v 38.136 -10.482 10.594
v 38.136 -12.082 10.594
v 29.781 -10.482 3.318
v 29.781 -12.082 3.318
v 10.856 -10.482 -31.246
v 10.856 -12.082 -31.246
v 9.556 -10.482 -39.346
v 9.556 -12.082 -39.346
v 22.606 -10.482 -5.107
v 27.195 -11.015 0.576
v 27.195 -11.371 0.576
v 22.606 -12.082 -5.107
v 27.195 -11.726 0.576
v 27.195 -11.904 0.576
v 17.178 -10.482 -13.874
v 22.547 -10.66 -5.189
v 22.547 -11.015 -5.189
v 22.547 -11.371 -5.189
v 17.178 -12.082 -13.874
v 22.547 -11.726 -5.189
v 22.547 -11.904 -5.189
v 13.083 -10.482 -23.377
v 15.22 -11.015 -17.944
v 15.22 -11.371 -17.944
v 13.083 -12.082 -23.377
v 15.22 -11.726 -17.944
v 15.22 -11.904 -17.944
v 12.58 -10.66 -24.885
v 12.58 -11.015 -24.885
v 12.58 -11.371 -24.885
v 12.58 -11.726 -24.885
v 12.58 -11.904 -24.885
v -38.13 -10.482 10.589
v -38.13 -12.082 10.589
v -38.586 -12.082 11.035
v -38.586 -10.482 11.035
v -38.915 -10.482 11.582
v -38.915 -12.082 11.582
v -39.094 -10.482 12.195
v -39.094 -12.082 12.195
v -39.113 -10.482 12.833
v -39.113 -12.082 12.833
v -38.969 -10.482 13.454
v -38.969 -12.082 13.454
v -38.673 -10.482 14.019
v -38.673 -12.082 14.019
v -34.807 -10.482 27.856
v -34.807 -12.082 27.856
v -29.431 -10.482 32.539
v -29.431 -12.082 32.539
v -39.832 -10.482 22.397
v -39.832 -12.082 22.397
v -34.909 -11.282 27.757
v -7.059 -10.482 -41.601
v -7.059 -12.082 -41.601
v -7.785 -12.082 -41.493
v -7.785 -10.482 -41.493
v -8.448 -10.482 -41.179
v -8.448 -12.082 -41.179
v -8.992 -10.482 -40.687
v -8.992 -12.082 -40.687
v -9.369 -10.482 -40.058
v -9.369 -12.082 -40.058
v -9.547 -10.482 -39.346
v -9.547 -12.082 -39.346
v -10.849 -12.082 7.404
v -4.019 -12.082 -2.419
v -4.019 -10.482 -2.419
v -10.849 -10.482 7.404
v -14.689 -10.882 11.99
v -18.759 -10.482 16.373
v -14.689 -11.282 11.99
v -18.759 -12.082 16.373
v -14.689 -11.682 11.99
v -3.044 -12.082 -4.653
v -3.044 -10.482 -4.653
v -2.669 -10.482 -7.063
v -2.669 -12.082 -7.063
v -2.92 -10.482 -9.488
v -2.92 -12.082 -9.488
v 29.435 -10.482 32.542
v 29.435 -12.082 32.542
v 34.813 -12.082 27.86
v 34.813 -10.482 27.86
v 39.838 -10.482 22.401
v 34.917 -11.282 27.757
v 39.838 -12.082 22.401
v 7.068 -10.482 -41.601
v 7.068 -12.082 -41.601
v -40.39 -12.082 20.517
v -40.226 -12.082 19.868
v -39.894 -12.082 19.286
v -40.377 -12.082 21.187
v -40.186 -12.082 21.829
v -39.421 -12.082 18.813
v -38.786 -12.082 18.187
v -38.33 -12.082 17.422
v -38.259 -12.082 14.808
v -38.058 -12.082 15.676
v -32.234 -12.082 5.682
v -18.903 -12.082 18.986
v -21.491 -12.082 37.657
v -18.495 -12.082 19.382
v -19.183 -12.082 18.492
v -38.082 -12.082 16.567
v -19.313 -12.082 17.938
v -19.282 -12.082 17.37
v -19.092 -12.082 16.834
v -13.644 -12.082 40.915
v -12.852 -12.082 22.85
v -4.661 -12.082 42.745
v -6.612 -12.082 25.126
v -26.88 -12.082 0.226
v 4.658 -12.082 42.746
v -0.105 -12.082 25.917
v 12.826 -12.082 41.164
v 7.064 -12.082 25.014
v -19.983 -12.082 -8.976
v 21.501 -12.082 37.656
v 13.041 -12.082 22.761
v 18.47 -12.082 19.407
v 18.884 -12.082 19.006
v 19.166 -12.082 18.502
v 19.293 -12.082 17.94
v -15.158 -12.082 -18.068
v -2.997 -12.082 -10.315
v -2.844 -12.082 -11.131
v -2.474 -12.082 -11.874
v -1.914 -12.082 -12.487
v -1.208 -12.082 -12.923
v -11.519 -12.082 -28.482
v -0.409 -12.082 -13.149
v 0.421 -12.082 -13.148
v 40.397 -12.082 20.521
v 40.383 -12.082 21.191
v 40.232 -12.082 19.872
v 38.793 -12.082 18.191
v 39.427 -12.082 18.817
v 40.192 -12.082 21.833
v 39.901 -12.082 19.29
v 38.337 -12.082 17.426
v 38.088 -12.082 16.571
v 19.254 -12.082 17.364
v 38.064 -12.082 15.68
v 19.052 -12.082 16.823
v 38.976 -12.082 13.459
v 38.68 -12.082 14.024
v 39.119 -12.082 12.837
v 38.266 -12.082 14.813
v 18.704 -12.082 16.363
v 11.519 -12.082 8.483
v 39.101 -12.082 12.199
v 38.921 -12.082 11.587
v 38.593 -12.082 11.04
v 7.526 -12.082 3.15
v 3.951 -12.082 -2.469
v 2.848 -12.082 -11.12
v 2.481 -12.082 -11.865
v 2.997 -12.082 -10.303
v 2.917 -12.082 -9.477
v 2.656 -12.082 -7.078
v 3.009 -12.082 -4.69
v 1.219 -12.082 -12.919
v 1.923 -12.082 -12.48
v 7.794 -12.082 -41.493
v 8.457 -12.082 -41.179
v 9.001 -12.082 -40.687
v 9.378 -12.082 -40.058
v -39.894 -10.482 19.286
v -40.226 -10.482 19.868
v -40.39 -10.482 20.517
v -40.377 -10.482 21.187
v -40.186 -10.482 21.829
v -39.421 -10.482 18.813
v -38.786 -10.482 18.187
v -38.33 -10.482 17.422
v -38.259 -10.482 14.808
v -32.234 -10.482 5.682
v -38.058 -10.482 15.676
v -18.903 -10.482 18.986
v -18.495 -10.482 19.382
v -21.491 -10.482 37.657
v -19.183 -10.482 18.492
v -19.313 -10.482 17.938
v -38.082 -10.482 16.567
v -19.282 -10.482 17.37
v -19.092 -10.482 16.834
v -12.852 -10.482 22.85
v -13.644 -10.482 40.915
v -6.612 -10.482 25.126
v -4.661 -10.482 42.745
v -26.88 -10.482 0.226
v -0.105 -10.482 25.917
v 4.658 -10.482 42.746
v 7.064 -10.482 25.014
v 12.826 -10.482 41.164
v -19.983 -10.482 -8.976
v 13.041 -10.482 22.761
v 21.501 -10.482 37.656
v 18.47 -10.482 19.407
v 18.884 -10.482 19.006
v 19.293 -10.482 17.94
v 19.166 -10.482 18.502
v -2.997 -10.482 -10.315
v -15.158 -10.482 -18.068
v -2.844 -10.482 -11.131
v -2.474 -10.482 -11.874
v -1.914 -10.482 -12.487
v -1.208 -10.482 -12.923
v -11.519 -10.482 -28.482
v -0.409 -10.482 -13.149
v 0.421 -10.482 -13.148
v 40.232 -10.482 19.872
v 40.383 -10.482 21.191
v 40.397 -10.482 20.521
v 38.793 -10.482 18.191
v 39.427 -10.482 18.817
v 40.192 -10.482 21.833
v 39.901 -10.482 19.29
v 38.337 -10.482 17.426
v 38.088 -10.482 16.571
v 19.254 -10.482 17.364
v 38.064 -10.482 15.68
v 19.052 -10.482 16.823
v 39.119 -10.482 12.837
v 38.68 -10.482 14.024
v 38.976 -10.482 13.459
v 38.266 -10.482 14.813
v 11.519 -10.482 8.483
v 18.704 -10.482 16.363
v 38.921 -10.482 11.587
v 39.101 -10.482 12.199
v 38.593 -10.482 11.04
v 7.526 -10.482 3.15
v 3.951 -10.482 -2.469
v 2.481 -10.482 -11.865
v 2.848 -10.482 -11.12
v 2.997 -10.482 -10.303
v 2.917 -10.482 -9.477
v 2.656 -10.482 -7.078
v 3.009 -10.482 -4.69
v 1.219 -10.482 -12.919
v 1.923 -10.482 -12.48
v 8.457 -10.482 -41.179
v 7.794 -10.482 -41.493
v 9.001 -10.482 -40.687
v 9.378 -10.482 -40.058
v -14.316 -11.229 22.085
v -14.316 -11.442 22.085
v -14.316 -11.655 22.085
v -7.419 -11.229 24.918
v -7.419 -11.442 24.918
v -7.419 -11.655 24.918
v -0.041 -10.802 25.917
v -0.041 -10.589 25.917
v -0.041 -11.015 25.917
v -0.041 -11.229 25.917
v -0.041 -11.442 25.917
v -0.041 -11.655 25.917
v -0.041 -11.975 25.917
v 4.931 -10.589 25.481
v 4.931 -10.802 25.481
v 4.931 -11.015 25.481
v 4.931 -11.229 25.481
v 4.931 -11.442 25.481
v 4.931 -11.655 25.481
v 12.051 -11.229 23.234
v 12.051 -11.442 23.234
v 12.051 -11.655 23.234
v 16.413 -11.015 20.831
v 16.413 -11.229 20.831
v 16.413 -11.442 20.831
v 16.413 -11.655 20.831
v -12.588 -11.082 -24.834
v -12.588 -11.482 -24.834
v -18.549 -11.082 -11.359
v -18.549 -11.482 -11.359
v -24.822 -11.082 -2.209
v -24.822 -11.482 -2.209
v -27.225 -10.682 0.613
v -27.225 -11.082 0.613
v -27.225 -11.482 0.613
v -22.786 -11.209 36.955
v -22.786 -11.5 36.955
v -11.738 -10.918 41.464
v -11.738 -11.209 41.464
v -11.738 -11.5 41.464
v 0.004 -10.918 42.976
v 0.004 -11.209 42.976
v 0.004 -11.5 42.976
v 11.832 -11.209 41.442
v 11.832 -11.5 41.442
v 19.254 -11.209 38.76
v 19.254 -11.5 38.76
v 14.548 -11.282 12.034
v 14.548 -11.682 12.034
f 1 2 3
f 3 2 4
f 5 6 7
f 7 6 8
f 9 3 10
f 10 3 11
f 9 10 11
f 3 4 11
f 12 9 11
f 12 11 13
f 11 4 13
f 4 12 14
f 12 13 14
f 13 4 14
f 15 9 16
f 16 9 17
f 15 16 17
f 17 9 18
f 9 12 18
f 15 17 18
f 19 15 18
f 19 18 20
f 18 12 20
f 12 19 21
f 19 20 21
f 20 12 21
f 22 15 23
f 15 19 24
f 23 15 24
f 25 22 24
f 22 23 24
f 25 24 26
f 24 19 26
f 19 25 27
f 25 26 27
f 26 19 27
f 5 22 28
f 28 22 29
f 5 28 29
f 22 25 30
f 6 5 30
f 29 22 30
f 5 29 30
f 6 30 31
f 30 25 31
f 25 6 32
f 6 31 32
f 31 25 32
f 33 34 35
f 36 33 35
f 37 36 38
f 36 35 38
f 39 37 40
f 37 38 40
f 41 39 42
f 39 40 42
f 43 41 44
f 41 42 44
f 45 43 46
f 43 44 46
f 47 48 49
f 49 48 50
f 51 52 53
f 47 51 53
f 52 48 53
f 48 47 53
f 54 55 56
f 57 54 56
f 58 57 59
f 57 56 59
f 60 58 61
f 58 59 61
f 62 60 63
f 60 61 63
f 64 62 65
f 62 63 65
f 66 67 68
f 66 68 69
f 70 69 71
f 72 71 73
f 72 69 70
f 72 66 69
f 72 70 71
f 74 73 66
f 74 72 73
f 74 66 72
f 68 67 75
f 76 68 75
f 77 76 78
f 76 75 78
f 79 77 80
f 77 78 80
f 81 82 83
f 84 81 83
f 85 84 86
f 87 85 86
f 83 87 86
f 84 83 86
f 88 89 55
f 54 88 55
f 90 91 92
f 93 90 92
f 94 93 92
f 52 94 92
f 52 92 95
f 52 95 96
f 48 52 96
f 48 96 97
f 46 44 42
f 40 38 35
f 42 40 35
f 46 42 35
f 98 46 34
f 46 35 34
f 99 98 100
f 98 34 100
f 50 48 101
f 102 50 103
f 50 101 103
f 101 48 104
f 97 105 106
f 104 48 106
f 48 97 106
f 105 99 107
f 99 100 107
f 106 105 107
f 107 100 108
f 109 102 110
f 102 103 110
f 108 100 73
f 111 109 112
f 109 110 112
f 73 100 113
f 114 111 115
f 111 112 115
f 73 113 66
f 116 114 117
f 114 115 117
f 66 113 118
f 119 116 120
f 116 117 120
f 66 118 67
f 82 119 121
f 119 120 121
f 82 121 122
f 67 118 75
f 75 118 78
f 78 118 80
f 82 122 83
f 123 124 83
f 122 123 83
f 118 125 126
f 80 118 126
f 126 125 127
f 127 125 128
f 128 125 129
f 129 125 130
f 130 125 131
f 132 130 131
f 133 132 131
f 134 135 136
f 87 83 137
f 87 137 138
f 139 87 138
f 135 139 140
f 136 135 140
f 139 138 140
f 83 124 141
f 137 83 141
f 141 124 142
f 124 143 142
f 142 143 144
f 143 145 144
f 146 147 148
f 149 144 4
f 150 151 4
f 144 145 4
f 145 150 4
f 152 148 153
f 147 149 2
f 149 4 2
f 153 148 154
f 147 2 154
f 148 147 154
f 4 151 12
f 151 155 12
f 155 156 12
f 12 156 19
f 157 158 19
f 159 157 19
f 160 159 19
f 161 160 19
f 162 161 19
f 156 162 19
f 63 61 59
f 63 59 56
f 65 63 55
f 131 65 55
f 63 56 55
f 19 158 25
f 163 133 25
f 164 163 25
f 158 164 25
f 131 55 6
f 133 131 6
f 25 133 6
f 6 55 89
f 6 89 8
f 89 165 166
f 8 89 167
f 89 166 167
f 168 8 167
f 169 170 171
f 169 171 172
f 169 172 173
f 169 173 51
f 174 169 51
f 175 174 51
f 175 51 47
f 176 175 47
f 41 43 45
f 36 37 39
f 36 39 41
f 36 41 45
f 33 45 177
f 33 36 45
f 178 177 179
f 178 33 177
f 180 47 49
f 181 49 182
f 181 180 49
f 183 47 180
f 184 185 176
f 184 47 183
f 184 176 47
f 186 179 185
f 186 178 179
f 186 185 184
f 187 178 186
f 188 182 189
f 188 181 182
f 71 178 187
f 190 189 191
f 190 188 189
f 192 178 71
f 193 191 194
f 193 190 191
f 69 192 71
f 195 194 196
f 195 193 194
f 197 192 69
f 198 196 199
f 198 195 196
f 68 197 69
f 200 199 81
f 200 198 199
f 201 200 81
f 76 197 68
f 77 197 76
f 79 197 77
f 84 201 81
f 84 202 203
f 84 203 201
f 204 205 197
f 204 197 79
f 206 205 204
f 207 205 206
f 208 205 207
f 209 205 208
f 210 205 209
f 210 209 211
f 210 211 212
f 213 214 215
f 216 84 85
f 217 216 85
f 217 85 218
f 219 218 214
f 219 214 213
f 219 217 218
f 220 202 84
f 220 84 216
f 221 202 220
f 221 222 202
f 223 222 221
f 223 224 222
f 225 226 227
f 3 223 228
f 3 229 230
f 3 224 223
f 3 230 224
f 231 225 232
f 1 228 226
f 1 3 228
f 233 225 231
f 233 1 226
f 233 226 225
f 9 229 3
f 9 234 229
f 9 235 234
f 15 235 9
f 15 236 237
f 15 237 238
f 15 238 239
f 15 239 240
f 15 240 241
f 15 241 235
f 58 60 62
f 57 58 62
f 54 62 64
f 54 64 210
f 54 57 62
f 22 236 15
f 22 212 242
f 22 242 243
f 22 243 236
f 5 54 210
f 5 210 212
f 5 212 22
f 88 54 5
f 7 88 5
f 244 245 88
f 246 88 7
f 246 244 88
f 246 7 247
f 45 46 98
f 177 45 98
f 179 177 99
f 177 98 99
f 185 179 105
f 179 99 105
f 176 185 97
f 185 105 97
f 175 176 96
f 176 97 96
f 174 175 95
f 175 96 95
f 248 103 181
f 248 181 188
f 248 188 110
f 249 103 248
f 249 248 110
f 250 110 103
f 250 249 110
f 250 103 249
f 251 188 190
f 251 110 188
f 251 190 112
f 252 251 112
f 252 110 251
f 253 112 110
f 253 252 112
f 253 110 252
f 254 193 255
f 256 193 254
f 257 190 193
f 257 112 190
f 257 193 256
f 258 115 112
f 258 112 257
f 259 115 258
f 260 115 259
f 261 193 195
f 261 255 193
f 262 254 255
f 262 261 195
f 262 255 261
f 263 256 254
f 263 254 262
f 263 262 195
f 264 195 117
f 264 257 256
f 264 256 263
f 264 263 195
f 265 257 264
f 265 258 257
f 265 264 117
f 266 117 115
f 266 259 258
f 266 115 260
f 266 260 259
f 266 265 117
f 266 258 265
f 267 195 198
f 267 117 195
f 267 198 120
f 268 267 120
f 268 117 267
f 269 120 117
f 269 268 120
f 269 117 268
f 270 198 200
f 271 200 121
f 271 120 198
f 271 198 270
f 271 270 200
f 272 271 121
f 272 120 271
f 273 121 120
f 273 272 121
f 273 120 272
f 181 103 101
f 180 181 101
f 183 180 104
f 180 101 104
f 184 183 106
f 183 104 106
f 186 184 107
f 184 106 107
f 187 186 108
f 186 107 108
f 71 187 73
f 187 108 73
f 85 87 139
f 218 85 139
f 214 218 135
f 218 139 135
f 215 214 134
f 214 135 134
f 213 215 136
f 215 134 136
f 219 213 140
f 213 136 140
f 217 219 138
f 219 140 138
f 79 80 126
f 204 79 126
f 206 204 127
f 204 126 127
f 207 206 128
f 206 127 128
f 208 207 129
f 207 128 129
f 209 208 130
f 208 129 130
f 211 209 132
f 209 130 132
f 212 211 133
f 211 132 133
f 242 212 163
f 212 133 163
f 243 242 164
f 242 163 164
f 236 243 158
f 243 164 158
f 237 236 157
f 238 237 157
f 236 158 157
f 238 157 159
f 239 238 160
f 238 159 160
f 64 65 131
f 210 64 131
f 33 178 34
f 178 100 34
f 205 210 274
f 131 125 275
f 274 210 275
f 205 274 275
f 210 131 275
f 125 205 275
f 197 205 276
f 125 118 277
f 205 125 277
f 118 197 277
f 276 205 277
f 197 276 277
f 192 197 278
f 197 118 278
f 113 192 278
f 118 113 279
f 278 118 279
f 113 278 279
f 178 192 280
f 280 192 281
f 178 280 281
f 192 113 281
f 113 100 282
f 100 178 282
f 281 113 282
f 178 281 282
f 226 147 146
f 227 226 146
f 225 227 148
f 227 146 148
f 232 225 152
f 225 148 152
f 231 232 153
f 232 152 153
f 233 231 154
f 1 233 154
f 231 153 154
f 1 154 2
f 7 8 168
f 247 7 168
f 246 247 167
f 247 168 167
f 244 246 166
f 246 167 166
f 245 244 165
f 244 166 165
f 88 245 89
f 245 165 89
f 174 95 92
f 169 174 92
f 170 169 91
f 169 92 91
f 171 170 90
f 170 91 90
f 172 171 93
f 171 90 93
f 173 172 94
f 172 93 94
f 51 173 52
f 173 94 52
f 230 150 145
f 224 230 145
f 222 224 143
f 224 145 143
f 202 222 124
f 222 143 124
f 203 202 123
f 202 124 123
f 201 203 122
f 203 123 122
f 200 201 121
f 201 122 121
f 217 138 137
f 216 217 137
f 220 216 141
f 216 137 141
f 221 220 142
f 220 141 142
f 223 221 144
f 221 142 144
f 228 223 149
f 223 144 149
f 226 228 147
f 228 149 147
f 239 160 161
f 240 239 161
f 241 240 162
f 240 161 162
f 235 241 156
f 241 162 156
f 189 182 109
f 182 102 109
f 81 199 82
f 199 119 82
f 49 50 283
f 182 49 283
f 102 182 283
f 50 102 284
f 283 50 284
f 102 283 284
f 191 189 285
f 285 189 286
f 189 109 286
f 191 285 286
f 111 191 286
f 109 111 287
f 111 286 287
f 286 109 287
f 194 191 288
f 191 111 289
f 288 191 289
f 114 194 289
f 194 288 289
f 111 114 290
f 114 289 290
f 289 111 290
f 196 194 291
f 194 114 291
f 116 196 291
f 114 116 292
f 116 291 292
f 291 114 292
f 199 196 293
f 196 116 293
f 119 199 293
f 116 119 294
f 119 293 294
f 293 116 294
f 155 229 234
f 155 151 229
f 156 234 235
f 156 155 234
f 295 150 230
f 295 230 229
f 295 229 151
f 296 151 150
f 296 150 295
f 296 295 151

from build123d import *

# Parameters (mm, degrees)
BOSS_EXTRUDE1_DEPTH = 1.6


with BuildPart() as part:
    # Sketch1 → Boss-Extrude1 (new body)
    with BuildSketch(Plane(origin=(0, -12.08184695, 0), x_dir=(1, 0, 0), z_dir=(0, 1, 0))):
        with BuildLine():
            Line((7.068263687, 41.600601737), (-7.059496612, 41.600601737))
            ThreePointArc((-7.059496612, 41.600601737), (-8.738121808, 40.953226214), (-9.547386312, 39.346375699))
            add(Edge.make_bspline(
                [(-9.547386312, 39.346375699), (-9.791801042, 36.872209768), (-10.174780597, 34.427308106), (-11.191257392, 29.590412993), (-11.825986881, 27.198679788), (-13.350641046, 22.469109457), (-14.231234092, 20.161687267), (-16.219413971, 15.670679569), (-17.327255507, 13.484910955), (-19.77160384, 9.233454443), (-21.107913128, 7.167662826), (-23.287017843, 4.160685833), (-24.044102201, 3.171933948), (-25.600832941, 1.24516113), (-26.401965146, 0.30483539), (-30.518180843, -4.284811803), (-34.16377144, -7.599360565), (-38.1299904, -10.589142877)],
                knots=[0, 0, 0, 0, 0.125, 0.125, 0.25, 0.25, 0.375, 0.375, 0.5, 0.5, 0.625, 0.625, 0.6875, 0.6875, 0.75, 0.75, 1, 1, 1, 1], degree=3))
            ThreePointArc((-38.1299904, -10.589142877), (-39.094420308, -12.194619809), (-38.673009405, -14.019474345))
            ThreePointArc((-38.673009405, -14.019474345), (-38.081769626, -16.566513233), (-39.42061036, -18.812503006))
            ThreePointArc((-39.42061036, -18.812503006), (-40.390492541, -20.517035077), (-39.831968266, -22.396969027))
            add(Edge.make_bspline(
                [(-39.831968266, -22.396969027), (-38.283172708, -24.266437753), (-36.643071519, -26.058655413), (-33.174318098, -29.455880725), (-31.352030623, -31.054807711), (-29.43071323, -32.539448808)],
                knots=[0, 0, 0, 0, 0.5, 0.5, 1, 1, 1, 1], degree=3))
            add(Edge.make_bspline(
                [(-29.43071323, -32.539448808), (-27.320643605, -34.16992841), (-25.110907511, -35.649716155), (-20.460386406, -38.259954595), (-18.045119378, -39.375356082), (-14.281591244, -40.731351728), (-13.014141837, -41.126537478), (-10.462616624, -41.801653768), (-9.177088412, -42.082104136), (-5.291542564, -42.754094477), (-2.662588178, -42.976416738), (0.004383999, -42.976416738)],
                knots=[0, 0, 0, 0, 0.25, 0.25, 0.5, 0.5, 0.625, 0.625, 0.75, 0.75, 1, 1, 1, 1], degree=3))
            add(Edge.make_bspline(
                [(0.004383999, -42.976416738), (2.671656674, -42.976416738), (5.319285582, -42.754113953), (9.259525556, -42.067540092), (10.556225677, -41.781619701), (13.107012662, -41.101381696), (14.362802441, -40.706759914), (16.836410325, -39.811946458), (18.054248498, -39.311810579), (20.452976989, -38.208815379), (21.635192506, -37.605209835), (25.119535884, -35.649249598), (27.327228533, -34.170936704), (29.435499854, -32.542167102)],
                knots=[0, 0, 0, 0, 0.25, 0.25, 0.375, 0.375, 0.5, 0.5, 0.625, 0.625, 0.75, 0.75, 1, 1, 1, 1], degree=3))
            add(Edge.make_bspline(
                [(29.435499854, -32.542167102), (31.356661411, -31.057999079), (33.183178175, -29.455634698), (36.651766782, -26.058931244), (38.289020033, -24.270113959), (39.837842074, -22.401078618)],
                knots=[0, 0, 0, 0, 0.5, 0.5, 1, 1, 1, 1], degree=3))
            ThreePointArc((39.837842074, -22.401078618), (40.396592097, -20.52122374), (39.426929699, -18.816579853))
            ThreePointArc((39.426929699, -18.816579853), (38.088433126, -16.570796705), (38.67950123, -14.024082445))
            ThreePointArc((38.67950123, -14.024082445), (39.100802356, -12.199274218), (38.136401576, -10.593861236))
            add(Edge.make_bspline(
                [(38.136401576, -10.593861236), (34.168623759, -7.602959081), (30.509352448, -4.27682522), (26.366767099, 0.349726066), (25.563654335, 1.294607123), (24.01416015, 3.216210378), (23.26679186, 4.194046735), (21.106661228, 7.178559095), (19.77567512, 9.236115194), (17.332454935, 13.487332018), (16.22037441, 15.681088283), (14.719864957, 19.076008242), (14.246709963, 20.227996379), (13.365900278, 22.544460809), (12.957352394, 23.710625613), (11.82518653, 27.232396594), (11.194571791, 29.611161178), (10.183276163, 34.430925487), (9.800625177, 36.871434644), (9.556155738, 39.346351897)],
                knots=[0, 0, 0, 0, 0.25, 0.25, 0.3125, 0.3125, 0.375, 0.375, 0.5, 0.5, 0.625, 0.625, 0.6875, 0.6875, 0.75, 0.75, 0.875, 0.875, 1, 1, 1, 1], degree=3))
            ThreePointArc((9.556155738, 39.346351897), (8.746897744, 40.953218184), (7.068263687, 41.600601737))
        make_face()
        with BuildLine():
            ThreePointArc((2.917114338, 9.477212595), (2.756374668, 5.872981189), (3.951101823, 2.468726748))
            add(Edge.make_bspline(
                [(18.704113686, -16.363172993), (17.992145269, -15.660180667), (17.284020826, -14.953500566), (15.898077439, -13.511066303), (15.216988025, -12.778449721), (13.209804316, -10.545981706), (11.922619235, -9.014699706), (8.217020706, -4.29052926), (5.969838206, -0.988031562), (3.951101823, 2.468726748)],
                knots=[0, 0, 0, 0, 0.125, 0.125, 0.25, 0.25, 0.5, 0.5, 1, 1, 1, 1], degree=3))
            ThreePointArc((18.704113686, -16.363172993), (19.293025471, -17.93950559), (18.470275007, -19.407403142))
            add(Edge.make_bspline(
                [(-18.494716896, -19.382200256), (-18.156747928, -19.627153591), (-17.818664146, -19.871886584), (-17.13548839, -20.34790294), (-16.790775019, -20.579912893), (-15.746956693, -21.257369006), (-15.038196301, -21.684285132), (-12.870713002, -22.885961299), (-11.370716058, -23.581511117), (-9.025130071, -24.441385157), (-8.223466165, -24.698129558), (-6.613792479, -25.137565491), (-5.80401834, -25.321234472), (-3.359849379, -25.763841436), (-1.710600897, -25.914327465), (0.793635304, -25.91836178), (1.634808791, -25.88219159), (3.293827112, -25.736118011), (4.115824788, -25.626398759), (6.559865603, -25.190037003), (8.159961985, -24.756217145), (10.518010173, -23.899908948), (11.293937095, -23.580881464), (12.808242427, -22.888006864), (13.549502528, -22.513052805), (15.00267183, -21.710479018), (15.714628815, -21.282945031), (16.762116652, -20.60495391), (17.107865076, -20.372830636), (17.792765058, -19.896747026), (18.131563633, -19.652153318), (18.470275007, -19.407403142)],
                knots=[0, 0, 0, 0, 0.03125, 0.03125, 0.0625, 0.0625, 0.125, 0.125, 0.25, 0.25, 0.3125, 0.3125, 0.375, 0.375, 0.5, 0.5, 0.5625, 0.5625, 0.625, 0.625, 0.75, 0.75, 0.8125, 0.8125, 0.875, 0.875, 0.9375, 0.9375, 0.96875, 0.96875, 1, 1, 1, 1], degree=3))
            ThreePointArc((-18.494716896, -19.382200256), (-19.313315476, -17.938131693), (-18.759498896, -16.373291495))
            add(Edge.make_bspline(
                [(-4.019478984, 2.418815751), (-6.073388857, -1.004555589), (-8.371219964, -4.274194721), (-12.087144101, -8.96897705), (-13.369226154, -10.496572825), (-15.349259798, -12.736872688), (-16.018851728, -13.47516887), (-17.376233604, -14.935672121), (-18.066404983, -15.655773734), (-18.759498896, -16.373291495)],
                knots=[0, 0, 0, 0, 0.5, 0.5, 0.75, 0.75, 0.875, 0.875, 1, 1, 1, 1], degree=3))
            ThreePointArc((-4.019478984, 2.418815751), (-2.778667962, 5.846147783), (-2.919787203, 9.488441319))
            ThreePointArc((-2.919787203, 9.488441319), (0.005771232, 13.17752407), (2.917114338, 9.477212595))
        make_face(mode=Mode.SUBTRACT)
    extrude(amount=BOSS_EXTRUDE1_DEPTH)


solid = part.part
